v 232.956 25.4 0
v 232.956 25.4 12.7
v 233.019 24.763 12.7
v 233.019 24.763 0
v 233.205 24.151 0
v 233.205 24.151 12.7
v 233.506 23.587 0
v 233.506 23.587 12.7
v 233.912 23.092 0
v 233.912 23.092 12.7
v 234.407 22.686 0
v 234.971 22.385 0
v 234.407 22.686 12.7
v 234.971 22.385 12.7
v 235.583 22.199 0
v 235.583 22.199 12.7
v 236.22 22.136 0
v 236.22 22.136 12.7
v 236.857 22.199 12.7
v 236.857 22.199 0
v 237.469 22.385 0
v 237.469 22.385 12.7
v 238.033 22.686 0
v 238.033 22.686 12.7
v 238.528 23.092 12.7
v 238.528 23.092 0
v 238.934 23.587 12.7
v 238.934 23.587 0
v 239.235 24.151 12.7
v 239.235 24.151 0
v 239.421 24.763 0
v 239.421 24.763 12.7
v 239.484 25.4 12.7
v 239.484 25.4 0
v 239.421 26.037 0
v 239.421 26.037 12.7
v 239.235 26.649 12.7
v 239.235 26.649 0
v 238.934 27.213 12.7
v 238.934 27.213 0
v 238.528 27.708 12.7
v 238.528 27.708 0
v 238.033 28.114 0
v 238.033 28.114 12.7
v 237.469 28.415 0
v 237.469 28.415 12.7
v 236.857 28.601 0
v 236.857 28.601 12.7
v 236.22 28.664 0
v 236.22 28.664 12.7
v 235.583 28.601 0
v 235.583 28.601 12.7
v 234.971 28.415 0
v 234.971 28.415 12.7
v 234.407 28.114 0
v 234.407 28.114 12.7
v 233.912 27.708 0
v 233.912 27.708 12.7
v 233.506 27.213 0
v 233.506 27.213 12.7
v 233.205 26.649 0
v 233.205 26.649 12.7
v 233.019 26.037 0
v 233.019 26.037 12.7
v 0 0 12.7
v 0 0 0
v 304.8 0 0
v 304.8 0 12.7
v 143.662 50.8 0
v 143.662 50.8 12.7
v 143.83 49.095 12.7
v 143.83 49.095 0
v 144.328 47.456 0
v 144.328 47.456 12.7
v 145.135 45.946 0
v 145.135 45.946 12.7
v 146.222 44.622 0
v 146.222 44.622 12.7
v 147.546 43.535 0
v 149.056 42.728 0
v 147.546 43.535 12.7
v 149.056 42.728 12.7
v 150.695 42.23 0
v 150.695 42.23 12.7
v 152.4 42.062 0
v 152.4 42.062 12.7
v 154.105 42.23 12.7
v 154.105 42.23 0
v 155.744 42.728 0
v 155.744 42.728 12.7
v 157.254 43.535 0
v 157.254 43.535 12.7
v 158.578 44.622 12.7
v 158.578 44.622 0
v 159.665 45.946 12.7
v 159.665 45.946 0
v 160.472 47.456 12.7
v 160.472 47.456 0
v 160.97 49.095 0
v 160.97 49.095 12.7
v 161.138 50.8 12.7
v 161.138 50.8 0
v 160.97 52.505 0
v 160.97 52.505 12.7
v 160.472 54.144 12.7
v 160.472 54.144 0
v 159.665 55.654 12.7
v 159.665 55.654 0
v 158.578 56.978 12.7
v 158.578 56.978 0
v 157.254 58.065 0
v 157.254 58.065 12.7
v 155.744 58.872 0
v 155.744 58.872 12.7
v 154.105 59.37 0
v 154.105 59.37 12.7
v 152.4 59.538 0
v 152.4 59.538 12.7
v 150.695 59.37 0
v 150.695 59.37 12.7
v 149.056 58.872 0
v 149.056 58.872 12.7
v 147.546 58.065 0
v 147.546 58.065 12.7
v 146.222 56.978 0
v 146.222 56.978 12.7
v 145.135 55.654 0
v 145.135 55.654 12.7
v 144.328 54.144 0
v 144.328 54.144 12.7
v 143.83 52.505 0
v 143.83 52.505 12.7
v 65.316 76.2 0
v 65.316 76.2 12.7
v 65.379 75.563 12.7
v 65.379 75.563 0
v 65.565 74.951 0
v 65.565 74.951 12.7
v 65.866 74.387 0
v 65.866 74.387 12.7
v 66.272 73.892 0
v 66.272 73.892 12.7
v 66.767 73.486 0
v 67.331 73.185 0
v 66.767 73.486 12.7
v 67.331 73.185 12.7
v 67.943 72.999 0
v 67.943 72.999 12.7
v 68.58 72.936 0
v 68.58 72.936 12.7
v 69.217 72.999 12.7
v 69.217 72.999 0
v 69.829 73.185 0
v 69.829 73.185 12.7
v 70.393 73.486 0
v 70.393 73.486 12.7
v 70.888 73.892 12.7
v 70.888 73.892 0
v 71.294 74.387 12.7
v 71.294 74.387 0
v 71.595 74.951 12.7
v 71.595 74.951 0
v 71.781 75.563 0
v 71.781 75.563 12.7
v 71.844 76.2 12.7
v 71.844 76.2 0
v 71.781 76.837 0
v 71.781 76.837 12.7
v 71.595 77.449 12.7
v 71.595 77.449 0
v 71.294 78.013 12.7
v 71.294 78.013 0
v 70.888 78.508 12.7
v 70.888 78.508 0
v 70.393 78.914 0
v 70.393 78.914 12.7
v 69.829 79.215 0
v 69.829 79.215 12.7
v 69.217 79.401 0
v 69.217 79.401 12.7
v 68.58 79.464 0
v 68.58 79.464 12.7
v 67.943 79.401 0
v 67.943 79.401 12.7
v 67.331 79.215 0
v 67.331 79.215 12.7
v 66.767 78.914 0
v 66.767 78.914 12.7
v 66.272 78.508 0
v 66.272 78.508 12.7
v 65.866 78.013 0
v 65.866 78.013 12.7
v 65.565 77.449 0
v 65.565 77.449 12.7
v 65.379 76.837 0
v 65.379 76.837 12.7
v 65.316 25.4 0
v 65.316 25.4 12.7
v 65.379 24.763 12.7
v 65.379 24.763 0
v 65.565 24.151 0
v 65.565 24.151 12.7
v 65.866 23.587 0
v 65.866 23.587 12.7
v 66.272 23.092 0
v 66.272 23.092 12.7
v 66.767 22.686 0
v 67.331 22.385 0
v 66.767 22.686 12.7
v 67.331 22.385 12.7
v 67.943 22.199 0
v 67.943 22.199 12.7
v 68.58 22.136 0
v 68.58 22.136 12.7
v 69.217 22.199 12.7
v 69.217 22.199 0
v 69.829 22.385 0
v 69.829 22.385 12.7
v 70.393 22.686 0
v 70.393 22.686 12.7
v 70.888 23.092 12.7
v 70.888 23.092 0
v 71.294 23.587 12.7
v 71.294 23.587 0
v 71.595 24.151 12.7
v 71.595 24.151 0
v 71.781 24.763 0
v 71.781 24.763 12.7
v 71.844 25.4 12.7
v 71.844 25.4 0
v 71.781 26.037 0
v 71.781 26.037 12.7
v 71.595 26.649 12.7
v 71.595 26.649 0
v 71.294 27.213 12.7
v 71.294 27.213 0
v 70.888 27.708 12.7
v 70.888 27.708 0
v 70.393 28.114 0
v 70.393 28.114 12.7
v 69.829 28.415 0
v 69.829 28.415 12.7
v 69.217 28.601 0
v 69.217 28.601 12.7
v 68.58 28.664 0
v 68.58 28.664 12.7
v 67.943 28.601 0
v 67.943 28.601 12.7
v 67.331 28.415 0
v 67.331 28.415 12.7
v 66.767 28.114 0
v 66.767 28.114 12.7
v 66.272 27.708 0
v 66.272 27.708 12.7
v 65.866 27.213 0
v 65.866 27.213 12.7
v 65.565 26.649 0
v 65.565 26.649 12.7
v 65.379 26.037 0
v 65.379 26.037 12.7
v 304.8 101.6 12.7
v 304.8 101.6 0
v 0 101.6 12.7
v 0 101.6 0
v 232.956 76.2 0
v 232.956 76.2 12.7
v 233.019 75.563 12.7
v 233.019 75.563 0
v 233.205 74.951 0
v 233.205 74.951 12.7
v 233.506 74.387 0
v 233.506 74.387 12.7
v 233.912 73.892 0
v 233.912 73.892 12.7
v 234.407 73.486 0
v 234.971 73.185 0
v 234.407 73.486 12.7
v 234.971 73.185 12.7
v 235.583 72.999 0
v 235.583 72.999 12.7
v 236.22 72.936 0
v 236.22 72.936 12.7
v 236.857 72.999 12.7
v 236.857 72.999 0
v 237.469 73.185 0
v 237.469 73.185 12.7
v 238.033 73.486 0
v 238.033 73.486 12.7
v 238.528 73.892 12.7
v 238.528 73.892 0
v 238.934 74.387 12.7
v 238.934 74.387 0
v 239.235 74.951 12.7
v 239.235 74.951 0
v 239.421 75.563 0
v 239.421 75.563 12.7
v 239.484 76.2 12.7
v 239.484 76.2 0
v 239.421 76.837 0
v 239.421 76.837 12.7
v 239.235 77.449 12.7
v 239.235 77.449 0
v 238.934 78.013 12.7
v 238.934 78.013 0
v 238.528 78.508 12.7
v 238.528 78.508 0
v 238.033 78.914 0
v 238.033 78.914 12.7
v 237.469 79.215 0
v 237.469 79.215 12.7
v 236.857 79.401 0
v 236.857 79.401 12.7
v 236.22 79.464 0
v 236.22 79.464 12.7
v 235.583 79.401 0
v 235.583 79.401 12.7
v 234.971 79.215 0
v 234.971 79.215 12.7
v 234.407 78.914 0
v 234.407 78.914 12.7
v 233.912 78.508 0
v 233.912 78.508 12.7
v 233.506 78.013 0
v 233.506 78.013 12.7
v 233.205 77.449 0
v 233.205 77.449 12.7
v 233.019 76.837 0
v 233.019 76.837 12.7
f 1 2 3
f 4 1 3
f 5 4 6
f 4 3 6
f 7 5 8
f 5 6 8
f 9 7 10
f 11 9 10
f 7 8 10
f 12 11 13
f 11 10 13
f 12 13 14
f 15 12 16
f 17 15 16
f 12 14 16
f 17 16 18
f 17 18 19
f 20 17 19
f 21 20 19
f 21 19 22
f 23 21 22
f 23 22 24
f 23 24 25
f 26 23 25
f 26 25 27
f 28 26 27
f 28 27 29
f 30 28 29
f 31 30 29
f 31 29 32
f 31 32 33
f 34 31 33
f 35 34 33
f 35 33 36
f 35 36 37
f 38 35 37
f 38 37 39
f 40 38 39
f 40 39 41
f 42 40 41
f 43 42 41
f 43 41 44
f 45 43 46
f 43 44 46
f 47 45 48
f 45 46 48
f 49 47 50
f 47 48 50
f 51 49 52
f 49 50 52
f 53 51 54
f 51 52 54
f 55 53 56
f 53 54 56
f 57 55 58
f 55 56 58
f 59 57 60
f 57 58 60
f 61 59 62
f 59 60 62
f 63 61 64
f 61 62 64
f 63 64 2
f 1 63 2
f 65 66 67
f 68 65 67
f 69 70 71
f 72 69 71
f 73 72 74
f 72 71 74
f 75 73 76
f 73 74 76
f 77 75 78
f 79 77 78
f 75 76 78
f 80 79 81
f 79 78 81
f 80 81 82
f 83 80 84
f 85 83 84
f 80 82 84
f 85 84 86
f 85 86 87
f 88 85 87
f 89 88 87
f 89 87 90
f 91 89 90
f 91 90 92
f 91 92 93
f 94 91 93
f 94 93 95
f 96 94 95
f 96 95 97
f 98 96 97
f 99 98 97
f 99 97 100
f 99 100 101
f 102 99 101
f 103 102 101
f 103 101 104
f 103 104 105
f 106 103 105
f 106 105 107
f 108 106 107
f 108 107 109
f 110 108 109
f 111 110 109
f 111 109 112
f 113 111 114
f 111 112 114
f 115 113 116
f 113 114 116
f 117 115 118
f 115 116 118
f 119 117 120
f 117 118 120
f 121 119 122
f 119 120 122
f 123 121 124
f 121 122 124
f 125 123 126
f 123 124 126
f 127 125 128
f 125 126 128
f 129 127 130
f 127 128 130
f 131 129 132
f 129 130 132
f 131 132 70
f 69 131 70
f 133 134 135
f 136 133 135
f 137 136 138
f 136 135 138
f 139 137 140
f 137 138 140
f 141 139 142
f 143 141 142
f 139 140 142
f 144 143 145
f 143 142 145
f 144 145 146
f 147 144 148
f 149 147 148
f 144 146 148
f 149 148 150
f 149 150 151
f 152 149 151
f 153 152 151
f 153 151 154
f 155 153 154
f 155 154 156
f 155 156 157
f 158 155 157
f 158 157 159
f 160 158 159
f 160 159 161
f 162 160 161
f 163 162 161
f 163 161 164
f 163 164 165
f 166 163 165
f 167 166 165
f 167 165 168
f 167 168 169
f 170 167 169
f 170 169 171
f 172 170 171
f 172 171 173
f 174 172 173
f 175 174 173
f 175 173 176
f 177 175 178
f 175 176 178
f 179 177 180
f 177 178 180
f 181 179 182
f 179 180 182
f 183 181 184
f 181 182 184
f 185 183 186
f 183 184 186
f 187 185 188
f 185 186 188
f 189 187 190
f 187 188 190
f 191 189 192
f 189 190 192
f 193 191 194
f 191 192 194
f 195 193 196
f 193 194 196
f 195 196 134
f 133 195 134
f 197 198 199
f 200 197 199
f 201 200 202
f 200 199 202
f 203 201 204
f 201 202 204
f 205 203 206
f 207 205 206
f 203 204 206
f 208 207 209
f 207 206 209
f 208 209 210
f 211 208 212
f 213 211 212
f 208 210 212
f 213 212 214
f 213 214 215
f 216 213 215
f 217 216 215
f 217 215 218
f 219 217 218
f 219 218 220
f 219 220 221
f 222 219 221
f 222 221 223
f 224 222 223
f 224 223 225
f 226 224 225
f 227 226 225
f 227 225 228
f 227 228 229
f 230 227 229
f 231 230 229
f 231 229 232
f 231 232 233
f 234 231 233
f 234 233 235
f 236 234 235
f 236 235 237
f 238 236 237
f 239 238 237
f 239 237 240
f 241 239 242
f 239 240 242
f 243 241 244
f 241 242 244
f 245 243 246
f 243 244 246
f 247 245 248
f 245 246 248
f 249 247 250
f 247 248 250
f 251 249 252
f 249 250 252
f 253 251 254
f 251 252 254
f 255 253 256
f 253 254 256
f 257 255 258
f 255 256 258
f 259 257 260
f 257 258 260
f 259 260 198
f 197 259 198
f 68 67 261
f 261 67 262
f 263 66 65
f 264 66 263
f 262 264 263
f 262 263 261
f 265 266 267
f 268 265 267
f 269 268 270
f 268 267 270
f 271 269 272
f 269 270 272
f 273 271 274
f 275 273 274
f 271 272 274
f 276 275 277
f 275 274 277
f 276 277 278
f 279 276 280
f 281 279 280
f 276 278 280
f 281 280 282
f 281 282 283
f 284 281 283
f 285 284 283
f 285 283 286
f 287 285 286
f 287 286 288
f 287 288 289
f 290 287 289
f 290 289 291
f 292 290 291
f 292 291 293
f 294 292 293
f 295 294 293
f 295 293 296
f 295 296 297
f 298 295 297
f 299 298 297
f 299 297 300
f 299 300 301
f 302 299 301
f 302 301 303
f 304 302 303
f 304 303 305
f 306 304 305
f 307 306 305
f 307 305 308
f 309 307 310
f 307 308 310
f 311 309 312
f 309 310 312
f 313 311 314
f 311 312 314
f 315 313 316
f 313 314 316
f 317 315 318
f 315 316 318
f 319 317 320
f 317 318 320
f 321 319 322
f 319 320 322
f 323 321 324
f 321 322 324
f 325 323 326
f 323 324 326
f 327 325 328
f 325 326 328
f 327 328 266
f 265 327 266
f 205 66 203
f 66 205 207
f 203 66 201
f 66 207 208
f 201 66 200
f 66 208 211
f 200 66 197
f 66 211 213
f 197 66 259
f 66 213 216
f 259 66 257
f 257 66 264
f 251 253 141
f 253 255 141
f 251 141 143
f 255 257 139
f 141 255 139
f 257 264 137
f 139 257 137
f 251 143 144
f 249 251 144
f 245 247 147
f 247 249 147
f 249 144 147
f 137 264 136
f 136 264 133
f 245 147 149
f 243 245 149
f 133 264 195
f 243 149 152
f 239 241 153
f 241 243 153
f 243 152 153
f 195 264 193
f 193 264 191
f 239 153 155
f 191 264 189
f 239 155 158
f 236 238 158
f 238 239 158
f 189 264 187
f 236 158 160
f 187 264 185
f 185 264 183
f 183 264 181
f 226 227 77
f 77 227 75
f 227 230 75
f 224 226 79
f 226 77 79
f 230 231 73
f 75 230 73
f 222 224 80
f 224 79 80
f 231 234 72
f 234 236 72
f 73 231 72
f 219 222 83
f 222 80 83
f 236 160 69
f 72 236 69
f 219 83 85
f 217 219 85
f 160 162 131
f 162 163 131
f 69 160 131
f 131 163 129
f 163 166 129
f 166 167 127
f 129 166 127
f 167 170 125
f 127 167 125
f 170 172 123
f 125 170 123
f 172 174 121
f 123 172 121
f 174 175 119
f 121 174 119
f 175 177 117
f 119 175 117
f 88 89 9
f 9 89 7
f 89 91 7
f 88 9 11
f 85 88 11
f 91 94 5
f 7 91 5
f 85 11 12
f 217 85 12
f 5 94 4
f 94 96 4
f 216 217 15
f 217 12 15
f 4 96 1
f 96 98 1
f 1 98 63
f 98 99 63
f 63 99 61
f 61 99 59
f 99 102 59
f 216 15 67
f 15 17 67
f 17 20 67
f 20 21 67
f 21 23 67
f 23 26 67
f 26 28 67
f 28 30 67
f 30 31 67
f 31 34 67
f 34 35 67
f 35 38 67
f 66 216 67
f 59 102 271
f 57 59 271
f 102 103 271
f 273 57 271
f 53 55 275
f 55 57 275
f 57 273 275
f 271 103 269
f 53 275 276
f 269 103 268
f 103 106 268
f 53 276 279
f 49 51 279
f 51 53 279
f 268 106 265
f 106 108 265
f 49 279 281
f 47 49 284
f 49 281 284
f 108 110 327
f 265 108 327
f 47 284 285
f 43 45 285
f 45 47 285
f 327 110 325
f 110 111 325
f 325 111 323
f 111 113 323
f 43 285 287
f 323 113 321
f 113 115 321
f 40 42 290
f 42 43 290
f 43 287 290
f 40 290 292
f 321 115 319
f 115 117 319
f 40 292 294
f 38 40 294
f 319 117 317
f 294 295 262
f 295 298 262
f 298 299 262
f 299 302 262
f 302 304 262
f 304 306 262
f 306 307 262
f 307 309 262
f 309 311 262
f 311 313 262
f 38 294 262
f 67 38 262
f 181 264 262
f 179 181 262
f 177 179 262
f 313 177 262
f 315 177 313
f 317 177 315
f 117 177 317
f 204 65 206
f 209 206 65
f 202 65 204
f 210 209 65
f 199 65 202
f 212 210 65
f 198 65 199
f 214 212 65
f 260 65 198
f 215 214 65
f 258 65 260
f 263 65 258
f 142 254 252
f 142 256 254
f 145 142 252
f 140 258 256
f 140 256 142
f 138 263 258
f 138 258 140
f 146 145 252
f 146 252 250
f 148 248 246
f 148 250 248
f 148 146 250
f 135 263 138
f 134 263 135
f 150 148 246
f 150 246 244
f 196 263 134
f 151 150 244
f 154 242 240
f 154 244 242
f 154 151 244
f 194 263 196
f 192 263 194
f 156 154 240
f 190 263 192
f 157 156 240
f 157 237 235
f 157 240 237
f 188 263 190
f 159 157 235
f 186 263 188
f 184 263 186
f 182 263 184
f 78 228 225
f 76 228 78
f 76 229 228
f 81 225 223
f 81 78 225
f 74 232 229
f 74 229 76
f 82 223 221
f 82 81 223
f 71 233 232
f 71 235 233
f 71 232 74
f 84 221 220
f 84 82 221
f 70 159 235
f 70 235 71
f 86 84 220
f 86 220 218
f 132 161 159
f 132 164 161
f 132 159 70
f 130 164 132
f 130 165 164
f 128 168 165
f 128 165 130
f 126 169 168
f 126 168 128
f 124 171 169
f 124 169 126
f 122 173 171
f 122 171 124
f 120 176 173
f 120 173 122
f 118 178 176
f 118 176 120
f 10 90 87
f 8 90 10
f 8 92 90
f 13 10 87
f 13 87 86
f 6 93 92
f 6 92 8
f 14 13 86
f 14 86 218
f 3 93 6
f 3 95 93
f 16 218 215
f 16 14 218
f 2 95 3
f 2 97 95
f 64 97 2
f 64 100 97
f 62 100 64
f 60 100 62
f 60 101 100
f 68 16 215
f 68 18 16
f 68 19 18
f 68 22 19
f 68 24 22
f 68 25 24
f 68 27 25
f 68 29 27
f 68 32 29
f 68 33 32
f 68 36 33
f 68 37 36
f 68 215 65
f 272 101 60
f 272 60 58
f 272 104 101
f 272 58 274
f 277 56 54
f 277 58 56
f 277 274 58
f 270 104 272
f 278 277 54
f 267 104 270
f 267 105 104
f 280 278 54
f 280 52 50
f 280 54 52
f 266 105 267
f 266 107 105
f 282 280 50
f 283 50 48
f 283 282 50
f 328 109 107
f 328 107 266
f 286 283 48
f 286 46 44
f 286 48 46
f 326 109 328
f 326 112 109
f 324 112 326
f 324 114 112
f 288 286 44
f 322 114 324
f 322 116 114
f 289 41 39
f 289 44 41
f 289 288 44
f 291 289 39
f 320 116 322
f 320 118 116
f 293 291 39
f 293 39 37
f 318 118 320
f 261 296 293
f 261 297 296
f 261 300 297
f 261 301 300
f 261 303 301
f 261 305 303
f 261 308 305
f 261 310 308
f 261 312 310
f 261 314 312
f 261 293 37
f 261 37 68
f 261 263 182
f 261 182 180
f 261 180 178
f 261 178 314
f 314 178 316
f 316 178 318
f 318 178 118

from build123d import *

# Parameters (mm, degrees)
F0_W     = 304.8
F0_H     = 101.6
F1_DEPTH = 12.7
F2_D     = 6.5278
F2_DEPTH = 16.9460333333
F2_TIP   = 1.9611489744
F3_D     = 17.4752
F3_DEPTH = 16.9418
F3_TIP   = 5.2500797448


with BuildPart() as f1:
    # F0 (on Top) → F1 (new body)
    with BuildSketch(Plane.XY):
        with Locations((152.4, 50.8)):
            Rectangle(F0_W, F0_H)
    extrude(amount=F1_DEPTH)

    # F2
    with Locations(Plane(origin=(0, 0, 0), x_dir=(1, 0, 0), z_dir=(0, 0, -1))):
        with Locations((68.58, -76.2), (68.58, -25.4), (236.22, -76.2), (236.22, -25.4)):
            Hole(F2_D / 2, depth=F2_DEPTH)
            with Locations((0, 0, -(F2_DEPTH + F2_TIP / 2))):  # 118° drill point
                Cone(0, F2_D / 2, F2_TIP, mode=Mode.SUBTRACT)

    # F3
    with Locations(Plane(origin=(0, 0, 0), x_dir=(1, 0, 0), z_dir=(0, 0, -1))):
        with Locations((152.4, -50.8)):
            Hole(F3_D / 2, depth=F3_DEPTH)
            with Locations((0, 0, -(F3_DEPTH + F3_TIP / 2))):  # 118° drill point
                Cone(0, F3_D / 2, F3_TIP, mode=Mode.SUBTRACT)


solid = f1.part
